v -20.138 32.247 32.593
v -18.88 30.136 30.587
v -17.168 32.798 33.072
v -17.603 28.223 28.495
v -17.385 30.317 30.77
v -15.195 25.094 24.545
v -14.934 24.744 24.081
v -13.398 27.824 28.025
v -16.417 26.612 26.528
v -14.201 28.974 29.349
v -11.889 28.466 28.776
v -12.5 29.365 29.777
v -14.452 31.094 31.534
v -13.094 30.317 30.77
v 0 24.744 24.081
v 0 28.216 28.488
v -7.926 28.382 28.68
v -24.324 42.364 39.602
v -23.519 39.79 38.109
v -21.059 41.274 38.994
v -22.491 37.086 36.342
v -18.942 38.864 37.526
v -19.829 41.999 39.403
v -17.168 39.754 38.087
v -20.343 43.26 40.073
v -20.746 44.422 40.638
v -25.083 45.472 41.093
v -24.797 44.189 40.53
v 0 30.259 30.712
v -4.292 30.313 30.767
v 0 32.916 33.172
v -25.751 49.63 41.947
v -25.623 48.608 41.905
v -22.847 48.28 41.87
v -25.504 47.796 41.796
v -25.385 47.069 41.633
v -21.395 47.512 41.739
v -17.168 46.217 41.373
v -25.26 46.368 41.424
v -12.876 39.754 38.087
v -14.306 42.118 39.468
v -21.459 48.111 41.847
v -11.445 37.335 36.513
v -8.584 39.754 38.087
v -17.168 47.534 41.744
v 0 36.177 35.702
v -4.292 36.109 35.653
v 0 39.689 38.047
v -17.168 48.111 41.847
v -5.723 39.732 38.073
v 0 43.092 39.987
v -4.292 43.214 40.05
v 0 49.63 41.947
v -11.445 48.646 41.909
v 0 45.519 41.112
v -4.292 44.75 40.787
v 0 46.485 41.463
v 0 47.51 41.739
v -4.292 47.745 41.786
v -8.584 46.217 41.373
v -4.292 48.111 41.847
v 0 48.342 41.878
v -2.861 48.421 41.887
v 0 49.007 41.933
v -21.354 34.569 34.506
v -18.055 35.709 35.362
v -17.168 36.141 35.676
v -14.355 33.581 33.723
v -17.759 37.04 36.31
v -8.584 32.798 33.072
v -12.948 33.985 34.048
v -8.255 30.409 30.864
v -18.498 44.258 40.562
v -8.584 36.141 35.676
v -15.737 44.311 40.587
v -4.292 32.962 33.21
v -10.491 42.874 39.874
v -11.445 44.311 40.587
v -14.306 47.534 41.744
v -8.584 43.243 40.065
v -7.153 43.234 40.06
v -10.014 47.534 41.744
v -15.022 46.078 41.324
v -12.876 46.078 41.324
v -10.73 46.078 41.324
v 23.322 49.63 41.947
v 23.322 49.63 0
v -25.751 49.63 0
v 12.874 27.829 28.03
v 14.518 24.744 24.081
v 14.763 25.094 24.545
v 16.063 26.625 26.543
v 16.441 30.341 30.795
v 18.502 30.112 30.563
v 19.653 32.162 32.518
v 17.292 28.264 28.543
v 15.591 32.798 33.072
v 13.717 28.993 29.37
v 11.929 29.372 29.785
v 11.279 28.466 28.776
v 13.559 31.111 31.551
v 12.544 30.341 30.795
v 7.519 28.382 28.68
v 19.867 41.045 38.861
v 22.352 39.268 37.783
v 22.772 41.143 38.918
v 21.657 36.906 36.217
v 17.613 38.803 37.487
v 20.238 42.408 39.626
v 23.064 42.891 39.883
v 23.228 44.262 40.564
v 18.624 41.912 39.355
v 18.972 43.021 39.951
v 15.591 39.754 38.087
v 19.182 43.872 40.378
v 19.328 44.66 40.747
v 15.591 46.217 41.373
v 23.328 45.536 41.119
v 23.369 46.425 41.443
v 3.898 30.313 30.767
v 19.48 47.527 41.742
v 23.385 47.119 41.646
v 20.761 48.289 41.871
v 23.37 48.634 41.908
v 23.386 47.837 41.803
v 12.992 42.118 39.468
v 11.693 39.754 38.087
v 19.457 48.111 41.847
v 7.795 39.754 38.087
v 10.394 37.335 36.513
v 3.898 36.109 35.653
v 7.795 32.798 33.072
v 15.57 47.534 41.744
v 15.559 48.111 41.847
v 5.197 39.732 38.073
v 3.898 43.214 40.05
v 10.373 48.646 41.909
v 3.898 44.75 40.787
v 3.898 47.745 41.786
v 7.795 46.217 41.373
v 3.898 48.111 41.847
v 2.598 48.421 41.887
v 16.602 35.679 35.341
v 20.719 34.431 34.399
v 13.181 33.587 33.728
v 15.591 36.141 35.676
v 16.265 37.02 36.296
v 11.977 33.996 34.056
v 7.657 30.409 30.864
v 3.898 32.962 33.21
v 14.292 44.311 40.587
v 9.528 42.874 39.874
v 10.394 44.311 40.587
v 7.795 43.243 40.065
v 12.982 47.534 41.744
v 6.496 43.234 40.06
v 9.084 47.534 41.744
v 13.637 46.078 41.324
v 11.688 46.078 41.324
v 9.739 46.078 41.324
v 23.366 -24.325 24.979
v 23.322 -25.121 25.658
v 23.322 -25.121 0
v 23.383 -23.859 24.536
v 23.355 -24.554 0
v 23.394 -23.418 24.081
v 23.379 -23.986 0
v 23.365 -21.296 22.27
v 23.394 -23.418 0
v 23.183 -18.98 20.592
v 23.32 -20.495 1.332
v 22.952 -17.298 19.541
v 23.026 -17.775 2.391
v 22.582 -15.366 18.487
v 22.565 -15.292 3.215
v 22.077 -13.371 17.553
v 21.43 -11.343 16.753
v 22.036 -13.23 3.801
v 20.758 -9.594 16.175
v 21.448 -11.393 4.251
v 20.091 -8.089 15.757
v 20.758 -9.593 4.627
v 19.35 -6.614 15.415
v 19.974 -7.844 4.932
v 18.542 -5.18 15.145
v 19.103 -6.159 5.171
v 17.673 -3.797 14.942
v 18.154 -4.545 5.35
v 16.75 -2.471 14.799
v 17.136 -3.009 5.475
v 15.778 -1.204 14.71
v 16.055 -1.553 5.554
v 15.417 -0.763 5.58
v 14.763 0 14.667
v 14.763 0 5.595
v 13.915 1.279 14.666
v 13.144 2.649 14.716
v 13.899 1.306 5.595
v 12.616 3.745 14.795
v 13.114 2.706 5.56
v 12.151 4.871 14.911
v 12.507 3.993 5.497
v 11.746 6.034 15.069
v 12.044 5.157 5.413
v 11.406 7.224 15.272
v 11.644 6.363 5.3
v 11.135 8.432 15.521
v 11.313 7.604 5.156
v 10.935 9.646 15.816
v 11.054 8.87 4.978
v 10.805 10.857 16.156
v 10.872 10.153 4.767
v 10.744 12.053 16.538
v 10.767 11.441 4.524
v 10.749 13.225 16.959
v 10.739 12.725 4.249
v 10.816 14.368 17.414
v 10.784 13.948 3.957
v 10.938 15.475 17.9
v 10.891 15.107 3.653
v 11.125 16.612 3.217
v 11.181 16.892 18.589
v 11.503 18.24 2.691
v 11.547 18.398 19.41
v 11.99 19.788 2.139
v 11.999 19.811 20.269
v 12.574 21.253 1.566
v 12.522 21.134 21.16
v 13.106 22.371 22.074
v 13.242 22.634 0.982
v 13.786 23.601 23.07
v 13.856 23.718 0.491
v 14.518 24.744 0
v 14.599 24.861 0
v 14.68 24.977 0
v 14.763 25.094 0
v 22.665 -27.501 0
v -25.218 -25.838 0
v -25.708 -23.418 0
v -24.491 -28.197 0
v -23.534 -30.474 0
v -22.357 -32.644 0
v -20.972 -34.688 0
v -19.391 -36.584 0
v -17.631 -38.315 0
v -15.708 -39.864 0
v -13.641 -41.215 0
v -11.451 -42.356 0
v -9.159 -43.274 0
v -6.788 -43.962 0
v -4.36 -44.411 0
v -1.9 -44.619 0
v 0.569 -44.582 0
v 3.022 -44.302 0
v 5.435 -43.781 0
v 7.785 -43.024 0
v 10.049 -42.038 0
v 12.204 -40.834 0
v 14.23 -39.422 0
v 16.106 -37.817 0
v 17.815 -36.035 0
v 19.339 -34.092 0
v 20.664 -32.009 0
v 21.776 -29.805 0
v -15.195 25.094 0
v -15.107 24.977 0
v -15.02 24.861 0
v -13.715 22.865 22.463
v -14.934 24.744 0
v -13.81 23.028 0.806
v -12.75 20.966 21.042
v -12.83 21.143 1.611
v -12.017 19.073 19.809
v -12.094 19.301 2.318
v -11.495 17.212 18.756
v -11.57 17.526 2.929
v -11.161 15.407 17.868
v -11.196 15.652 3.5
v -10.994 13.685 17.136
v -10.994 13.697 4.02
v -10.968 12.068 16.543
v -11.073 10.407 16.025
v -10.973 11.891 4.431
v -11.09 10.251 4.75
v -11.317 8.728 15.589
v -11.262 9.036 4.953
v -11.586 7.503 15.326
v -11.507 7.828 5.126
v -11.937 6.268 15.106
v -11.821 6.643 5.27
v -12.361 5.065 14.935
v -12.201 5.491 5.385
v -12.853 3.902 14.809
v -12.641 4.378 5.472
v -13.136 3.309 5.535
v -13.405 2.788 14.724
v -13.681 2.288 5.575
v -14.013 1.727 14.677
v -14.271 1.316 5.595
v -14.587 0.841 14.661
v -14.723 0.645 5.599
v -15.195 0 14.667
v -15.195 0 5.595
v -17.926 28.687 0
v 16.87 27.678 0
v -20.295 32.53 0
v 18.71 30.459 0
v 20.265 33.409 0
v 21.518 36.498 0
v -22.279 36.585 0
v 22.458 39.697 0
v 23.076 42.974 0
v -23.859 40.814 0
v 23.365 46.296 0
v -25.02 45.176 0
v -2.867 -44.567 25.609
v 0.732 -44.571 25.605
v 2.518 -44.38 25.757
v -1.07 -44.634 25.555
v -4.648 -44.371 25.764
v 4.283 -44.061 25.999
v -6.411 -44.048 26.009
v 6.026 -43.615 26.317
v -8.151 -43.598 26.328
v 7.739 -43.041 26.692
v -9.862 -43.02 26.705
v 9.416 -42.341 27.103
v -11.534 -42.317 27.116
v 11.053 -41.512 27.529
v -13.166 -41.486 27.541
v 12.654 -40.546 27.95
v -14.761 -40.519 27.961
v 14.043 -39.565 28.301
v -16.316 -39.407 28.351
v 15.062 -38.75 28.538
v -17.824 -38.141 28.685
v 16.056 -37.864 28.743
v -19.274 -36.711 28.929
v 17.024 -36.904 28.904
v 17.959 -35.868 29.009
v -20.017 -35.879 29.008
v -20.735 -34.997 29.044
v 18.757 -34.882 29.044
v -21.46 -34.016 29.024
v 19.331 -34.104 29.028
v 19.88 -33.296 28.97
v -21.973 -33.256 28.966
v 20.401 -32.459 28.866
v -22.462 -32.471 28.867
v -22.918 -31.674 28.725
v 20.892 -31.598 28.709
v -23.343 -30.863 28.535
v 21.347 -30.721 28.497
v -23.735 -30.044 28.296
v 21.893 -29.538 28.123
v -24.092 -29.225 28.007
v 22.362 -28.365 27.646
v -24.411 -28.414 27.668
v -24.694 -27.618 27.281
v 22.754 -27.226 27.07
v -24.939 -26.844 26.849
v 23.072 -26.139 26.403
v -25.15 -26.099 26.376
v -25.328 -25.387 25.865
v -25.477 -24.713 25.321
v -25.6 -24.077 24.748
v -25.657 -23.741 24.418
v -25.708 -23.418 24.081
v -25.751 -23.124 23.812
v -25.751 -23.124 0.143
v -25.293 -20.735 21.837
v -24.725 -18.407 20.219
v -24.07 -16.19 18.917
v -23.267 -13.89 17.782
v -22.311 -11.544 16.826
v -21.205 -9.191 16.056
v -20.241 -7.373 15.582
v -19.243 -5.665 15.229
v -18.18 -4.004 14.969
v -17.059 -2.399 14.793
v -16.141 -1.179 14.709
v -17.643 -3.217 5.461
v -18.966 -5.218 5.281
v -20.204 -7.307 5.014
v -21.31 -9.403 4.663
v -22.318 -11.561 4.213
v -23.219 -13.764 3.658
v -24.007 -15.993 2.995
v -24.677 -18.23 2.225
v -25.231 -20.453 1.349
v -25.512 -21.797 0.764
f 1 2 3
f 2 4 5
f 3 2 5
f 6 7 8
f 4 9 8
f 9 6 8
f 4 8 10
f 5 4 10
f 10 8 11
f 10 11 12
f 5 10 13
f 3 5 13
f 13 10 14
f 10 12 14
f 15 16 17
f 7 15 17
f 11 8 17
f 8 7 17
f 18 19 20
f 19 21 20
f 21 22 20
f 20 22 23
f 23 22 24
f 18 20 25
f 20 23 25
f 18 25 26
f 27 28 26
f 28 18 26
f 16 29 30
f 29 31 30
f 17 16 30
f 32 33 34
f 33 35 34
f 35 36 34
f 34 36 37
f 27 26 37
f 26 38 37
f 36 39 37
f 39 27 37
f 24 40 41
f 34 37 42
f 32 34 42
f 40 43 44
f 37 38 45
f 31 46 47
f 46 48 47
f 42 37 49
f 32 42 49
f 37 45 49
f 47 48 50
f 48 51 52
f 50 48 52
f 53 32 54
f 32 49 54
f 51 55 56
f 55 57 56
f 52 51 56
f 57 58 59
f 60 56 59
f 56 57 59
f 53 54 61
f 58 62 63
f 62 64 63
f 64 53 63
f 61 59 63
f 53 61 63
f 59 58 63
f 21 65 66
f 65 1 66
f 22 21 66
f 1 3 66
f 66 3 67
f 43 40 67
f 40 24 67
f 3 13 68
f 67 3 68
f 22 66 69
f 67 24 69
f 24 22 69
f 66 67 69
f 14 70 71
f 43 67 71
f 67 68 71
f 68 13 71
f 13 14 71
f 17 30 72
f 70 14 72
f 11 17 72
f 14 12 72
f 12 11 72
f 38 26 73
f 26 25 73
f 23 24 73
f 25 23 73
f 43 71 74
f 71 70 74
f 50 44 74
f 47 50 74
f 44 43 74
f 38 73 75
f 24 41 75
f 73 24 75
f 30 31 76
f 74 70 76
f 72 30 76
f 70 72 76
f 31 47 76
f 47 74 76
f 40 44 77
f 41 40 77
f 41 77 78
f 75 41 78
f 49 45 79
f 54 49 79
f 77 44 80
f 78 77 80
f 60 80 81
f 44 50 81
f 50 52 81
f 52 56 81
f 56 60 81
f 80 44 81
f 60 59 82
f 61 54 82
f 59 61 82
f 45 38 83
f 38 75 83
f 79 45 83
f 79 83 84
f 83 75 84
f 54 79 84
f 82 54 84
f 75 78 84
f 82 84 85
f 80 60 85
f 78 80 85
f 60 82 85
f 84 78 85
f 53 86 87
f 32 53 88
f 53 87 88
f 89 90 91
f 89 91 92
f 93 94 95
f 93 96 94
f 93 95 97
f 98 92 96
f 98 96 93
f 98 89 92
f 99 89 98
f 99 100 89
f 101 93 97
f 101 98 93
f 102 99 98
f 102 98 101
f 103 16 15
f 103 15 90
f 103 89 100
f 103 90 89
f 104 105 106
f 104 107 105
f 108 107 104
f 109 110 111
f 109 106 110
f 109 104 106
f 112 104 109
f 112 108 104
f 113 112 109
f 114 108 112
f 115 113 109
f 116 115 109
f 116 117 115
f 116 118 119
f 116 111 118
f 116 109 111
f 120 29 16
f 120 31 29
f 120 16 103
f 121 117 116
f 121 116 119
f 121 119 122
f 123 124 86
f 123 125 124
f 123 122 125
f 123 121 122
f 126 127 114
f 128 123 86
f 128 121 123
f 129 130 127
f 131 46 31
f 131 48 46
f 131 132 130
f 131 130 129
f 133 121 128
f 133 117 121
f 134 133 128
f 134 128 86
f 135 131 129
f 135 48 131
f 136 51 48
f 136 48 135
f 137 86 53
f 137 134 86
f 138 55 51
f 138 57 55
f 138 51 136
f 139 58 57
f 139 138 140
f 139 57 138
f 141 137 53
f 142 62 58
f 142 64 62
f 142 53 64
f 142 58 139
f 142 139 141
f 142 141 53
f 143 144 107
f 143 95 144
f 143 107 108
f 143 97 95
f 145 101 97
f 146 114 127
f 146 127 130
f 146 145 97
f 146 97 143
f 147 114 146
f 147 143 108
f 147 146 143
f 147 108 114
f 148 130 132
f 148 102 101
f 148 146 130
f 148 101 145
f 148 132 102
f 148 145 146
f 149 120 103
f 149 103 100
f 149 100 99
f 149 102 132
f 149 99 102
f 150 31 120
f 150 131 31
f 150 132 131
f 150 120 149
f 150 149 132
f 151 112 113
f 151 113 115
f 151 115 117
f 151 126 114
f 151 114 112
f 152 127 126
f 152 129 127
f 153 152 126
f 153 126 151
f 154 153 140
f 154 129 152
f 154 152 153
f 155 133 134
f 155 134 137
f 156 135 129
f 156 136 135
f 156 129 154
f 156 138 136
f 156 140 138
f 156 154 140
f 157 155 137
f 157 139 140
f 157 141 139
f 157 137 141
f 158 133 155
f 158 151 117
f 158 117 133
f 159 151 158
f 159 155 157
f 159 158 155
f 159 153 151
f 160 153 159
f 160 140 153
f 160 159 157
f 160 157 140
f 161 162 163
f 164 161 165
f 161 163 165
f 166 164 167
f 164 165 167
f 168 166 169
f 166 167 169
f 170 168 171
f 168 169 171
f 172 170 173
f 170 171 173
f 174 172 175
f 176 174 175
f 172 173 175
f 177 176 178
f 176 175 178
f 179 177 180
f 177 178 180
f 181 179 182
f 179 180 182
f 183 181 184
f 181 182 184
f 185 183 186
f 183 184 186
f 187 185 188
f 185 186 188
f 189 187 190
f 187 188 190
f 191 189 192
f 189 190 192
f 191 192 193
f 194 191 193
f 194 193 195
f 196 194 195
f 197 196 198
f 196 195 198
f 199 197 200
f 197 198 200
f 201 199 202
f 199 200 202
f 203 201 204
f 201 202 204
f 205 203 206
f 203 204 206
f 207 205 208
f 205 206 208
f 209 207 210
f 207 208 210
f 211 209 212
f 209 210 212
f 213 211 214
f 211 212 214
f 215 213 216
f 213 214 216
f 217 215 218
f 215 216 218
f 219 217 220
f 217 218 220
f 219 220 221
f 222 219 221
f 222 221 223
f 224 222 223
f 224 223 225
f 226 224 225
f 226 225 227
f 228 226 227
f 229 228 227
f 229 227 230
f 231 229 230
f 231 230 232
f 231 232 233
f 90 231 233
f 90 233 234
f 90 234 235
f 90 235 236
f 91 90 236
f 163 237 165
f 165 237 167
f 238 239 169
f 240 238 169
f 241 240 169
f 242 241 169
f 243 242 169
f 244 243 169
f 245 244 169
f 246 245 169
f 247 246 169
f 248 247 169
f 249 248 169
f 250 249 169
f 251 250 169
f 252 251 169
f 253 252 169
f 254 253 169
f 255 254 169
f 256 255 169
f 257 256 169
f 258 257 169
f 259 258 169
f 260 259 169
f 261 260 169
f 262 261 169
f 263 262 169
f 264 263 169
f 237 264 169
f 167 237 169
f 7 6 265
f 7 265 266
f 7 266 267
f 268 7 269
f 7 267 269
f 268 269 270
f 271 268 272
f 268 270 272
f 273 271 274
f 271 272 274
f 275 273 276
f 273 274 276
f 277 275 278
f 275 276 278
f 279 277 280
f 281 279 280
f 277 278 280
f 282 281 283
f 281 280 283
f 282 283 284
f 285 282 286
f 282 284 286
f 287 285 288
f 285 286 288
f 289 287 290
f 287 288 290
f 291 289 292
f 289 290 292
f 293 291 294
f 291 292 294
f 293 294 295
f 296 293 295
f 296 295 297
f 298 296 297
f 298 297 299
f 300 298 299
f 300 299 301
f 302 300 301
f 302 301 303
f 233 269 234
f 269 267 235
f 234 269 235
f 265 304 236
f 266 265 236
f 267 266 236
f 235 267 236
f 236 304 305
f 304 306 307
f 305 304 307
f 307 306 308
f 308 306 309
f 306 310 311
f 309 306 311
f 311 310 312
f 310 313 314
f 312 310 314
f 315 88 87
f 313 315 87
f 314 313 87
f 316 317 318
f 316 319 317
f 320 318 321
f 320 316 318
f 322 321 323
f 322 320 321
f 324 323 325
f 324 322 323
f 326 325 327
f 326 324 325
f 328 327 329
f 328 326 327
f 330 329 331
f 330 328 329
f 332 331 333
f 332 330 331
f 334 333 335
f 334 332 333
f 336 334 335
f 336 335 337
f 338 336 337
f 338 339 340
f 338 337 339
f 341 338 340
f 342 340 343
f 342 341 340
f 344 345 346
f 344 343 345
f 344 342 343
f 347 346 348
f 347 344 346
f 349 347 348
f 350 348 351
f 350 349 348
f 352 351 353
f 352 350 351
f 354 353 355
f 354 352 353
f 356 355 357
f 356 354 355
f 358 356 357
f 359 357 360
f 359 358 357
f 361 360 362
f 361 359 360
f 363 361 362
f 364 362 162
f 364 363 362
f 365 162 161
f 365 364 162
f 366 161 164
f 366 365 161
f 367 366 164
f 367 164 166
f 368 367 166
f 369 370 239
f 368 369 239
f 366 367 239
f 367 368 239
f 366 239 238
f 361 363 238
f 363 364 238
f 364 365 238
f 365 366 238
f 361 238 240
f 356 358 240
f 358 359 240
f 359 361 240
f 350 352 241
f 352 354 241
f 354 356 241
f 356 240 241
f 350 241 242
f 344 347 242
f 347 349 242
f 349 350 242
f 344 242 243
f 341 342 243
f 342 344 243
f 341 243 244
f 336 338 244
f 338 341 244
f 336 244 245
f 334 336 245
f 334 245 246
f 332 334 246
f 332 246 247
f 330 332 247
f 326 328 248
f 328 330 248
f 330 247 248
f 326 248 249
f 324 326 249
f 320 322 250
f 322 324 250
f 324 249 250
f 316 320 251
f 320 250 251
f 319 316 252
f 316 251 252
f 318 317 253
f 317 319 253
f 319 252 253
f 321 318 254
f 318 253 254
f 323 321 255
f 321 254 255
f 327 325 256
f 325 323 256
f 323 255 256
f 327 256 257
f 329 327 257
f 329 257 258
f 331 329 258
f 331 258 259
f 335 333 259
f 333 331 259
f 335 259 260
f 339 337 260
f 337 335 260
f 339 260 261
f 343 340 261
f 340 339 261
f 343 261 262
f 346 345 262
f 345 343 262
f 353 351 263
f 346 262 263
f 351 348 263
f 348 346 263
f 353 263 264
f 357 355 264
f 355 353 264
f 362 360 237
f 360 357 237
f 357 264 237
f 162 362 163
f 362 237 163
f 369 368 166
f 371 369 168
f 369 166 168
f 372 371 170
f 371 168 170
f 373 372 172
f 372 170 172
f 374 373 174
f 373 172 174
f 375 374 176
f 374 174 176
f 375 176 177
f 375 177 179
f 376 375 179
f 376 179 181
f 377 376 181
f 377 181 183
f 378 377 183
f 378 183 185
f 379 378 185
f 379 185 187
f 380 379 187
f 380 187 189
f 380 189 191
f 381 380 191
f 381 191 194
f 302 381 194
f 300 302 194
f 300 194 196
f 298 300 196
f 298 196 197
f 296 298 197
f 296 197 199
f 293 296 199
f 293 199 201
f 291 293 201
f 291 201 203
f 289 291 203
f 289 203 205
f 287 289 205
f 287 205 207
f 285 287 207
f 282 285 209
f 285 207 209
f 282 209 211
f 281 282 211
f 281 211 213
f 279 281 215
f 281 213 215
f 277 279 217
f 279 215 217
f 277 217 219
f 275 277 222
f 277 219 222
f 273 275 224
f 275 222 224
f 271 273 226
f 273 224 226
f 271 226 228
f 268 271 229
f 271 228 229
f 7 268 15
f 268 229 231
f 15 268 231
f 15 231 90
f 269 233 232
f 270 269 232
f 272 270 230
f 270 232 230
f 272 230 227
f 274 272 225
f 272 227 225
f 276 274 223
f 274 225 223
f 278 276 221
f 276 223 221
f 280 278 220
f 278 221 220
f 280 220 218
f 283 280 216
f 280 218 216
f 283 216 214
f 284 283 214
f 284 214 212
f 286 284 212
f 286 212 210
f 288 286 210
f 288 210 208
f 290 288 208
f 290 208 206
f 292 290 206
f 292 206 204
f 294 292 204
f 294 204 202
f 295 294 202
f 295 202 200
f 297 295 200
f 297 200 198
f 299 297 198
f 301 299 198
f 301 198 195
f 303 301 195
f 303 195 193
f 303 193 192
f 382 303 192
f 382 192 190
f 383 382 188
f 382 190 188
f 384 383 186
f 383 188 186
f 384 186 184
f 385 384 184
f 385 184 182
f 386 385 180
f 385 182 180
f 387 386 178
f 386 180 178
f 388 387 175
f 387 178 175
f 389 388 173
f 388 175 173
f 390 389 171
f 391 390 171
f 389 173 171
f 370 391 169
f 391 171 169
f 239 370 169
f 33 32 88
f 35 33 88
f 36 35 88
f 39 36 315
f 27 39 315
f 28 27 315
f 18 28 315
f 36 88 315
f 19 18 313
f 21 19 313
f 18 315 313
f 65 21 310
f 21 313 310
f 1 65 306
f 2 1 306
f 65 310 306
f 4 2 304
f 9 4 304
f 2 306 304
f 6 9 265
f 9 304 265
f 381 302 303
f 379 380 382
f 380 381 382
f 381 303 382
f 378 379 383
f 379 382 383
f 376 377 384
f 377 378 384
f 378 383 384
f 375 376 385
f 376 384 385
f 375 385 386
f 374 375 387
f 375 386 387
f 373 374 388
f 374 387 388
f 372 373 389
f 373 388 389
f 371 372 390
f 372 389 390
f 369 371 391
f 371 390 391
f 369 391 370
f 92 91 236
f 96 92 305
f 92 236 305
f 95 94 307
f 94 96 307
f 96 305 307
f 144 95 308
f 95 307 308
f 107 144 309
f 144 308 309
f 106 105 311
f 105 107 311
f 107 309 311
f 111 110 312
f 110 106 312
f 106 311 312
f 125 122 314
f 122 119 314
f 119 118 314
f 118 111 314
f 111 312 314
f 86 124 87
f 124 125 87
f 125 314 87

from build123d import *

# Parameters (mm, degrees)
F1_DEPTH = 50.8
F3_DEPTH = 25.4
F4_DEPTH = 50.8


with BuildPart() as f1:
    # F0 (on Top) → F1 (new body)
    with BuildSketch(Plane.XY):
        with BuildLine():
            ThreePointArc((-15.1947466657, 0), (-22.0060110943, -10.86221038), (-25.7512666285, -23.1241025031))
            ThreePointArc((-25.7512666285, -23.1241025031), (-2.0484127491, -44.6133454073), (23.3222842216, -25.1212809235))
            ThreePointArc((23.3222842216, -25.1212809235), (21.5555211936, -11.7044416716), (14.7629464045, 0))
            ThreePointArc((14.7629464045, 0), (10.7387450248, 12.5467581674), (14.7629464045, 25.0935163349))
            ThreePointArc((14.7629464045, 25.0935163349), (21.5180813897, 36.4983696165), (23.3222842216, 49.63029176))
            Line((23.3222842216, 49.63029176), (-25.7512666285, 49.63029176))
            ThreePointArc((-25.7512666285, 49.63029176), (-22.2790381522, 36.5848904706), (-15.1947466657, 25.0935163349))
            ThreePointArc((-15.1947466657, 25.0935163349), (-10.9623069939, 12.5467581674), (-15.1947466657, 0))
        make_face()
    extrude(amount=F1_DEPTH)

    # F2 (on Right) → F3 (cut)
    with BuildSketch(Plane.YZ):
        with BuildLine():
            ThreePointArc((24.7435215861, 0), (0.6627701223, 5.5987162901), (-23.4179813415, 0))
            Line((-23.4179813415, 0), (24.7435215861, 0))
        make_face()
        with BuildLine():
            ThreePointArc((-46.2089851499, 24.0807514638), (-34.8134832457, 29.0446018263), (-23.4179813415, 24.0807514638))
            ThreePointArc((-23.4179813415, 24.0807514638), (0.6627701223, 14.6606816853), (24.7435215861, 24.0807514638))
            add(Edge.make_bspline(
                [(24.7435215861, 24.0807514638), (26.9770560839, 27.0474434767), (31.7641691677, 33.4059260361), (45.7356507893, 42.0064080333), (49.0760807653, 41.9577828011), (50.1966327429, 41.9414713979)],
                knots=[0, 0, 0, 0, 0.3675927898, 0.7878581036, 1, 1, 1, 1], degree=3))
            Line((50.1966327429, 41.9414713979), (50.1966327429, 52.80091241))
            Line((50.1966327429, 52.80091241), (-46.2089851499, 52.80091241))
            Line((-46.2089851499, 52.80091241), (-46.2089851499, 24.0807514638))
        make_face()
    extrude(amount=F3_DEPTH, mode=Mode.SUBTRACT)

    # F2 (on Right) → F4 (cut)
    with BuildSketch(Plane.YZ):
        with BuildLine():
            ThreePointArc((-46.2089851499, 24.0807514638), (-34.8134832457, 29.0446018263), (-23.4179813415, 24.0807514638))
            ThreePointArc((-23.4179813415, 24.0807514638), (0.6627701223, 14.6606816853), (24.7435215861, 24.0807514638))
            add(Edge.make_bspline(
                [(24.7435215861, 24.0807514638), (26.9770560839, 27.0474434767), (31.7641691677, 33.4059260361), (45.7356507893, 42.0064080333), (49.0760807653, 41.9577828011), (50.1966327429, 41.9414713979)],
                knots=[0, 0, 0, 0, 0.3675927898, 0.7878581036, 1, 1, 1, 1], degree=3))
            Line((50.1966327429, 41.9414713979), (50.1966327429, 52.80091241))
            Line((50.1966327429, 52.80091241), (-46.2089851499, 52.80091241))
            Line((-46.2089851499, 52.80091241), (-46.2089851499, 24.0807514638))
        make_face()
        with BuildLine():
            ThreePointArc((24.7435215861, 0), (0.6627701223, 5.5987162901), (-23.4179813415, 0))
            Line((-23.4179813415, 0), (24.7435215861, 0))
        make_face()
    extrude(amount=-F4_DEPTH, mode=Mode.SUBTRACT)


solid = f1.part
